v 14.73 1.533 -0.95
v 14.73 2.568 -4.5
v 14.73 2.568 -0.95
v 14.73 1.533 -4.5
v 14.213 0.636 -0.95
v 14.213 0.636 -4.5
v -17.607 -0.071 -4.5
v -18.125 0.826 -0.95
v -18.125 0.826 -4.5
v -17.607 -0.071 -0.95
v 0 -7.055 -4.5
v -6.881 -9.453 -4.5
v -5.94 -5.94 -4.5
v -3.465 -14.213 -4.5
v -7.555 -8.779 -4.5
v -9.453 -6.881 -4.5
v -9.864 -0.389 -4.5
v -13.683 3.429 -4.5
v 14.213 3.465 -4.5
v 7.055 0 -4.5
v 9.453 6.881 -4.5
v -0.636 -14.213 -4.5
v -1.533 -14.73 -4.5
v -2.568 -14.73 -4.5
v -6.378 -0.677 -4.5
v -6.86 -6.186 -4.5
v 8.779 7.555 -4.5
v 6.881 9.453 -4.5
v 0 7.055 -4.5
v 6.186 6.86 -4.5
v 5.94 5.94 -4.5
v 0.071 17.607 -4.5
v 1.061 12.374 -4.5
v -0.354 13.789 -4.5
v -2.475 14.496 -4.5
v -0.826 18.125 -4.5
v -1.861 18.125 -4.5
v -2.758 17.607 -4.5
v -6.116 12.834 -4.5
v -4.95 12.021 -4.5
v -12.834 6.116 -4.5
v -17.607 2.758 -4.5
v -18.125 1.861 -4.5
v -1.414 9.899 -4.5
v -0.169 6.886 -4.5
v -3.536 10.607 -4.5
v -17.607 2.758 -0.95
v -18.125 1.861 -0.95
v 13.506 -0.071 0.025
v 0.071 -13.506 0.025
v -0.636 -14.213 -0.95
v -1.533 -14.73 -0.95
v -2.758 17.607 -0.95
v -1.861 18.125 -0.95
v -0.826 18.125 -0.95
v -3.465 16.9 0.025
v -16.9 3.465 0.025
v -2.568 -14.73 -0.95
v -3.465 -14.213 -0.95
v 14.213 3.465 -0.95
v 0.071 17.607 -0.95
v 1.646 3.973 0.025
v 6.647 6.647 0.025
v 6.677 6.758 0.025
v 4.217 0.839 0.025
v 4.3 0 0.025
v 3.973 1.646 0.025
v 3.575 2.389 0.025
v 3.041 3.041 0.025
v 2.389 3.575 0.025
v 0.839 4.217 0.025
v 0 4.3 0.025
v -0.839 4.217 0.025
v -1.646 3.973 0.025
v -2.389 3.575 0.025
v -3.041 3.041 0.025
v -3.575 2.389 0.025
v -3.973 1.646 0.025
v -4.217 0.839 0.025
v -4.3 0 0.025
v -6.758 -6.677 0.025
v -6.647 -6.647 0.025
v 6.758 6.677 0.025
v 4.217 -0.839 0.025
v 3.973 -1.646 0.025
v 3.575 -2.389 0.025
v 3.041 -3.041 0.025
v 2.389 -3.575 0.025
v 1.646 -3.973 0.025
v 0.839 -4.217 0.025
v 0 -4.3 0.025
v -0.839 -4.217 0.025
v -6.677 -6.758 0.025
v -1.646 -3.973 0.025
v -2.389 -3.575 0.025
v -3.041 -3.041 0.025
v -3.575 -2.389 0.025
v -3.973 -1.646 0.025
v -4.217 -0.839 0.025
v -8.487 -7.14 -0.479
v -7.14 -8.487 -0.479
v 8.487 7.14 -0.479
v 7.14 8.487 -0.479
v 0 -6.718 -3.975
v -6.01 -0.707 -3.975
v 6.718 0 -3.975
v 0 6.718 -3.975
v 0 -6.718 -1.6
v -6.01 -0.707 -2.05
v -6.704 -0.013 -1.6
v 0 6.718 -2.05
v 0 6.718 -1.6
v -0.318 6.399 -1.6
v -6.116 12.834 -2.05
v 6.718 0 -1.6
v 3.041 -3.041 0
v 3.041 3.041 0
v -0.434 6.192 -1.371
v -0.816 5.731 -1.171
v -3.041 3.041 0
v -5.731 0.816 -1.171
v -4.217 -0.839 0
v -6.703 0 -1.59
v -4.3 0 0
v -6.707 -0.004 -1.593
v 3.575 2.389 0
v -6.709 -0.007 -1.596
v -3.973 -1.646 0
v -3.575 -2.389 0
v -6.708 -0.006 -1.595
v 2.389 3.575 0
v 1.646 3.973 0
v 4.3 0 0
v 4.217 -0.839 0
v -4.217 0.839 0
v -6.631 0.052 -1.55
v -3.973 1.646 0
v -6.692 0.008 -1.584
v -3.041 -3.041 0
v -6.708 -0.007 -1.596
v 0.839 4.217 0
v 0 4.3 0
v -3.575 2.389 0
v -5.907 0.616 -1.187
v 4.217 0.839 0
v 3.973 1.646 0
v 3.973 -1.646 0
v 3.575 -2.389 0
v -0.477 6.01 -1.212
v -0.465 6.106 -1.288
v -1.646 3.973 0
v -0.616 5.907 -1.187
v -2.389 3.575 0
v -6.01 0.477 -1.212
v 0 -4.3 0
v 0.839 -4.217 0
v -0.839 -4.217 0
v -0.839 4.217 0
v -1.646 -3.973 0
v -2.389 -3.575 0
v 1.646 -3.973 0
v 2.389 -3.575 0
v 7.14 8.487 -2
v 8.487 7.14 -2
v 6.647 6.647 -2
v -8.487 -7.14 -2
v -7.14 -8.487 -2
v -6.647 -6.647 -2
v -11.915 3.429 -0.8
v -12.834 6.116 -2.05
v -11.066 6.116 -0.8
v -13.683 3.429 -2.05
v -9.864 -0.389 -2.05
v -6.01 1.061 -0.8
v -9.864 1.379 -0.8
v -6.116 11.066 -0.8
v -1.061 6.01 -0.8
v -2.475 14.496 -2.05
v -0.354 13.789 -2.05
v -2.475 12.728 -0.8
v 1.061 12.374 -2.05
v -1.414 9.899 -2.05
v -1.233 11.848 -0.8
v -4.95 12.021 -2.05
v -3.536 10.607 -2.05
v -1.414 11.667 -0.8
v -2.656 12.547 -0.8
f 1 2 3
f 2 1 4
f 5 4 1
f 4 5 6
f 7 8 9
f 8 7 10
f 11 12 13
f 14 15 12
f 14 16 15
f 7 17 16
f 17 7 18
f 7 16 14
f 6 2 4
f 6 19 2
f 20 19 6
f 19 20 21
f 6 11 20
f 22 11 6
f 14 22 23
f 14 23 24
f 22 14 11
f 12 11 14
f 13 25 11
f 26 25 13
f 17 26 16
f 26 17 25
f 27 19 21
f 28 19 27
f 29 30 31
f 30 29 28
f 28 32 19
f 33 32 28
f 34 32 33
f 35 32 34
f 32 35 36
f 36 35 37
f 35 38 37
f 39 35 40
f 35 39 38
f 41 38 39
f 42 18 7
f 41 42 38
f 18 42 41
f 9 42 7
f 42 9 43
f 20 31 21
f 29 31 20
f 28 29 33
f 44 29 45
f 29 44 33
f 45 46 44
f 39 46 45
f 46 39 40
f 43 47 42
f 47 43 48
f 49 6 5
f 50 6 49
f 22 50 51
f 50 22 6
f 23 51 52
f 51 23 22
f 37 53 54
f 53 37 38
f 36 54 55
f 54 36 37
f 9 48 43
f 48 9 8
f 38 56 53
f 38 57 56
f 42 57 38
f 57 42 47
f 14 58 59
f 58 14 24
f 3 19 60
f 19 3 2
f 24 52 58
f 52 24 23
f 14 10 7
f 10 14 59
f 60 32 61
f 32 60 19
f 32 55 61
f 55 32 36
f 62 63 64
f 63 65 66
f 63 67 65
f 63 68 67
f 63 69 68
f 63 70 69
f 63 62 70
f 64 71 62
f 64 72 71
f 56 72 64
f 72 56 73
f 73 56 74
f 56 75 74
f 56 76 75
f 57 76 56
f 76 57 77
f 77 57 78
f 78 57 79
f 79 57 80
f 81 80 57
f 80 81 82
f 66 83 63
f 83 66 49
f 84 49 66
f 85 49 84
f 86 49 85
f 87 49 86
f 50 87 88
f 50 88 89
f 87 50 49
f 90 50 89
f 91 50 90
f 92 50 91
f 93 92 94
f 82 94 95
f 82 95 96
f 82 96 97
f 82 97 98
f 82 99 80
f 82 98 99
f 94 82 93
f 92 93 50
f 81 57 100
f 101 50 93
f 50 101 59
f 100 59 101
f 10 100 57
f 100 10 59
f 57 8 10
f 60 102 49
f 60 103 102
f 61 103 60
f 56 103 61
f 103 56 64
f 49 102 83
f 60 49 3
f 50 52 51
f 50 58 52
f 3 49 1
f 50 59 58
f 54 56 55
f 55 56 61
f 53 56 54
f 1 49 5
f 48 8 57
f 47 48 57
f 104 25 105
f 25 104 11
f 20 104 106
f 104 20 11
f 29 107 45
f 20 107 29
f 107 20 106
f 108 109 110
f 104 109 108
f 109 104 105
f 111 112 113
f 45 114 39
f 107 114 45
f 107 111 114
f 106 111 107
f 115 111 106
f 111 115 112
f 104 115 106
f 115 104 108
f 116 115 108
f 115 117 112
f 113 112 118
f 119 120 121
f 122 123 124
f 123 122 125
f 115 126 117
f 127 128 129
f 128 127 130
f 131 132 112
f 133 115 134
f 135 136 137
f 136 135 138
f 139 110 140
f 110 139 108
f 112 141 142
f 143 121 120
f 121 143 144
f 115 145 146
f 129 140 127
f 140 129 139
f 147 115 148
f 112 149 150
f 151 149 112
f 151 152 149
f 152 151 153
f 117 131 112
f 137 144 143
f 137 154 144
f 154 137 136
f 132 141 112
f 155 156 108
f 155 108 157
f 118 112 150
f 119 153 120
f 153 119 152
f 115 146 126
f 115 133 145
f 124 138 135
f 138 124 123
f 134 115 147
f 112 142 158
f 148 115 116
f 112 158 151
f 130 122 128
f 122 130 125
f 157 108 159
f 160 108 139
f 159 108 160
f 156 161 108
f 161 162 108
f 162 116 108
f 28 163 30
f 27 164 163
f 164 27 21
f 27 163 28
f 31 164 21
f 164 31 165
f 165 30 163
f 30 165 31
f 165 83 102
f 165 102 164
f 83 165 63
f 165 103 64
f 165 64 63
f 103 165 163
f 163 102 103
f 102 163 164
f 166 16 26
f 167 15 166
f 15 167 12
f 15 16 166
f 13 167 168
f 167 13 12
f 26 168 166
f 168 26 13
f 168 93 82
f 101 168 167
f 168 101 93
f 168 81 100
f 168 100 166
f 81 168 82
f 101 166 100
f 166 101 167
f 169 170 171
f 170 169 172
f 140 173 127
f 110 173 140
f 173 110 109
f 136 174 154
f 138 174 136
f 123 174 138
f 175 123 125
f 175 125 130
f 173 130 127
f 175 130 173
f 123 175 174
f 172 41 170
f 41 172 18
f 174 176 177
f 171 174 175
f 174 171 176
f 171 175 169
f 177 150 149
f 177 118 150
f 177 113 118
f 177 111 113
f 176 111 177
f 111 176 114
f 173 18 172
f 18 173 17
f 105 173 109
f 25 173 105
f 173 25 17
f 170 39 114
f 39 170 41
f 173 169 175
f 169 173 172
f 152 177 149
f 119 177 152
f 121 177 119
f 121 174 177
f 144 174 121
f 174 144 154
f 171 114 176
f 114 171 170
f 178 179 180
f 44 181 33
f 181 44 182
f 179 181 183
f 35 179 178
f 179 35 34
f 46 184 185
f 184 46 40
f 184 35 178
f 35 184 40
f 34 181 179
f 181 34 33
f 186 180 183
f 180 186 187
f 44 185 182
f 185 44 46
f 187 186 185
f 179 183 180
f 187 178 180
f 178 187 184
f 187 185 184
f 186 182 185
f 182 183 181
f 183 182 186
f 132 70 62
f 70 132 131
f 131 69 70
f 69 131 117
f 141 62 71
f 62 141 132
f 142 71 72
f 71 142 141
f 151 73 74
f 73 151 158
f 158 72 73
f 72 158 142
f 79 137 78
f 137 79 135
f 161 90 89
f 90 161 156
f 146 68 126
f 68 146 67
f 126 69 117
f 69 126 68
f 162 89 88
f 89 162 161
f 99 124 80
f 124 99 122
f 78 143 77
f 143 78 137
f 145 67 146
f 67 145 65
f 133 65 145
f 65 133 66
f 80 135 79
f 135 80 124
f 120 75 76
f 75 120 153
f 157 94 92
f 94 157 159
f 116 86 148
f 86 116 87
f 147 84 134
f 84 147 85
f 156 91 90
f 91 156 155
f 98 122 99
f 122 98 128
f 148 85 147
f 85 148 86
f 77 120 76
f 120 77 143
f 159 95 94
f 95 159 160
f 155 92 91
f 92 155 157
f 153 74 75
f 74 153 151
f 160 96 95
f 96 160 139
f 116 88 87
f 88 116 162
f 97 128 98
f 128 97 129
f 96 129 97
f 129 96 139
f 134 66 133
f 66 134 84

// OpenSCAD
// file: range_tour_dashcam.scad
/******************************************************************
*                                                                 *
* OpenFlexure Microscope: USB camera push-fit mount               *
*                                                                 *
* This is part of the OpenFlexure microscope, an open-source      *
* microscope and 3-axis translation stage.  It gets really good   *
* precision over a ~10mm range, by using plastic flexure          *
* mechanisms.                                                     *
*                                                                 *
* This file defines one useful function, usbcam_push_fit().  It's *
* designed to be subtracted from a solid block, with the bottom   *
* of the block at z=0.  It grips the plastic camera housing with  *
* a "trylinder" gripper, holding it in securely.  It might be     *
* that you need a cover or something to secure the camera fully.  *
*                                                                 *
* (c) Richard Bowman, January 2016                                *
* Released under the CERN Open Hardware License                   *
*                                                                 *
******************************************************************/


use <../utilities.scad>;

// Camera geometry (mostly of the bottom of the lens mount)
lens_holder_tube_r = 13.5/2; // the tube into which the lens screws
lens_holder_tube_h = 12.6; // the height of the tube above the PCB
lens_holder_clearance = 0.35; // extra space around the camera to make sure it fits
lens_holder_box_h = 3.6;
lens_holder_box = [2,2,0] * lens_holder_tube_r + [0,0,1] * lens_holder_box_h; // box at the bottom of the tube
lens_holder_mounting_screw_y = 9; // position of the lugs for mounting screws
lens_holder_mounting_screw_lug_r = 2.2; // size of above.
camera_component_clearance = 1; // it's easiest to have the PCB slightly below the mount

d=0.05; //small distance!
$fn=32;

function range_tour_camera_sensor_height() = 0.5; //Height of the sensor above the PCB

function range_tour_camera_mount_height()=4;

module range_tour_camera_mount(){
    h = range_tour_camera_mount_height();
    sy = lens_holder_mounting_screw_y;
    sr = lens_holder_mounting_screw_lug_r+0.5;
    box_w = 13.2 + 1; //make it slightly fatter so it grips the bed more
    sensor_w = 10 + 0.8; //reasonably tight fit around sensor
    solder_w = (box_w-1.2*2); //the solder terminals need some give
    translate([0,0,-h]) difference(){
        linear_extrude(h+d) difference(){
            union(){
                square(box_w, center=true);
                hull() reflect([0,1]) translate([0,sy]) circle(r=sr, $fn=16);
            }
            //screws
            reflect([0,1]) translate([0,sy]) circle(d=1.5, $fn=16);
            //sensor
            //square(sensor_w, center=true);
        }
        //chamfer the screw holes
        reflect([0,1,0]) translate([0,sy,0]){
            cylinder(r1=3, r2=0,h=4, center=true);
            deformable_hole_trylinder(1.5/2,2.1/2,h=12, center=true);
        }
        // enlarge the cut out for the sensor
        // NB the solder terminals will distort the thin bottom, this
        // is intentional, to help with bed adhesion
        cube([sensor_w, sensor_w, 2],center=true);
        sequential_hull(){
            translate([0,0,0.7]) cube([solder_w,solder_w,d],center=true);
            translate([0,0,0.7+(solder_w-sensor_w)/2]) cube([sensor_w, sensor_w, d],center=true);
            translate([0,0,2]) cube([sensor_w, sensor_w, d],center=true);
            translate([0,0,h+d]) cylinder(r=5,h=d);
        }
    }
}
range_tour_camera_mount();
module range_tour_bottom_mounting_posts(height=-1, radius=-1, outers=true, cutouts=true){
    // posts to mount to pi camera from below
    r = radius > 0 ? radius : 2;
    h = height > 0 ? height : 4;
    rotate(45)
    for(pos=[[19/2, 10/2, 0], [-19/2, -10/2, 0]]) translate(pos) difference(){
        if(outers) cylinder(r=r, h=h, $fn=12);
        if(cutouts) intersection(){
            cylinder(h=13, d=2*1.7, center=true, $fn=3);
            rotate(60) cylinder(h=999, d=2*1.7*1.4, center=true, $fn=3);
        }
    }
}

//range_tour_bottom_mounting_posts();
// file: 6led.scad
/******************************************************************
*                                                                 *
* OpenFlexure Microscope: USB camera push-fit mount               *
*                                                                 *
* This is part of the OpenFlexure microscope, an open-source      *
* microscope and 3-axis translation stage.  It gets really good   *
* precision over a ~10mm range, by using plastic flexure          *
* mechanisms.                                                     *
*                                                                 *
* This file defines one useful function, usbcam_push_fit().  It's *
* designed to be subtracted from a solid block, with the bottom   *
* of the block at z=0.  It grips the plastic camera housing with  *
* a "trylinder" gripper, holding it in securely.  It might be     *
* that you need a cover or something to secure the camera fully.  *
*                                                                 *
* (c) Richard Bowman, January 2016                                *
* Released under the CERN Open Hardware License                   *
*                                                                 *
******************************************************************/


use <../utilities.scad>
use <./m12.scad>

// Camera geometry (mostly of the bottom of the lens mount)
lens_holder_tube_r = 13.5/2; // the tube into which the lens screws
lens_holder_tube_h = 12.6; // the height of the tube above the PCB
lens_holder_clearance = 0.35; // extra space around the camera to make sure it fits
lens_holder_box_h = 3.6;
lens_holder_box = [2,2,0] * lens_holder_tube_r + [0,0,1] * lens_holder_box_h; // box at the bottom of the tube
lens_holder_mounting_screw_y = 9; // position of the lugs for mounting screws
lens_holder_mounting_screw_lug_r = 2.2; // size of above.
camera_component_clearance = 1; // it's easiest to have the PCB slightly below the mount

d=0.05; //small distance!
$fn=32;

function 6led_camera_sensor_height() = m12_camera_sensor_height(); //Height of the sensor above the PCB


module 6led_lens_mount(){
    m12_lens_mount();
}


function 6led_camera_mount_height()=m12_camera_mount_height();

module 6led_camera_mount(){ //this is the same as the M12 mount
    m12_camera_mount();
}


module 6led_bottom_mounting_posts(height=-1, radius=-1, outers=true, cutouts=true){
    //holes are (28-2.25*2)=23.5mm apart in Y and (33-4.45*2)=24.1mm apart in X
    r = radius > 0 ? radius : 2;
    h = height > 0 ? height : 4;
    rotate(45)
    reflect([1,0,0]) reflect([0,1,0]) translate([24.1/2, 23.5/2, 0]) difference(){
        if(outers) cylinder(r=r, h=h, $fn=12);
        if(cutouts) intersection(){
            translate([0,0,-2]) rotate(75) trylinder_selftap(2, h=h+3);
        }
    }
}

//translate([0,0,-1]) picam_pcb_bottom();
// file: m12.scad
/******************************************************************
*                                                                 *
* OpenFlexure Microscope: USB camera push-fit mount               *
*                                                                 *
* This is part of the OpenFlexure microscope, an open-source      *
* microscope and 3-axis translation stage.  It gets really good   *
* precision over a ~10mm range, by using plastic flexure          *
* mechanisms.                                                     *
*                                                                 *
* This file defines one useful function, usbcam_push_fit().  It's *
* designed to be subtracted from a solid block, with the bottom   *
* of the block at z=0.  It grips the plastic camera housing with  *
* a "trylinder" gripper, holding it in securely.  It might be     *
* that you need a cover or something to secure the camera fully.  *
*                                                                 *
* (c) Richard Bowman, January 2016                                *
* Released under the CERN Open Hardware License                   *
*                                                                 *
******************************************************************/


use <../utilities.scad>

// Camera geometry (mostly of the bottom of the lens mount)
lens_holder_tube_r = 13.5/2; // the tube into which the lens screws
lens_holder_tube_h = 12.6; // the height of the tube above the PCB
lens_holder_clearance = 0.35; // extra space around the camera to make sure it fits
lens_holder_box_h = 3.6;
lens_holder_box = [2,2,0] * lens_holder_tube_r + [0,0,1] * lens_holder_box_h; // box at the bottom of the tube
lens_holder_mounting_screw_y = 9; // position of the lugs for mounting screws
lens_holder_mounting_screw_lug_r = 2.2; // size of above.
camera_component_clearance = 1; // it's easiest to have the PCB slightly below the mount

$fn=32;

function m12_camera_sensor_height() = 0.5; //Height of the sensor above the PCB


module usbcam_lens_mount(){
    union(){
        cylinder(r=lens_holder_tube_r, h=lens_holder_tube_h, $fn=16);
        translate([0,0,lens_holder_box_h/2]) cube(lens_holder_box, center=true);
        hull() reflect([0,1,0]) translate([0,lens_holder_mounting_screw_y,0])
            cylinder(r=lens_holder_mounting_screw_lug_r, h=lens_holder_box_h, $fn=12);
    }
}


function m12_camera_mount_height()=4;

module m12_camera_mount(){
    h = m12_camera_mount_height();
    sy = lens_holder_mounting_screw_y;
    sr = lens_holder_mounting_screw_lug_r+0.5;
    box_w = 13.2 + 1; //make it slightly fatter so it grips the bed more
    sensor_w = 10 + 0.8; //reasonably tight fit around sensor
    solder_w = (box_w-1.2*2); //the solder terminals need some give
    translate([0,0,-h]) difference(){
        linear_extrude(h+tiny()) difference(){
            union(){
                square(box_w, center=true);
                hull() reflect([0,1]) translate([0,sy]) circle(r=sr, $fn=16);
            }
            //screws
            reflect([0,1]) translate([0,sy]) circle(d=1.5, $fn=16);
            //sensor
            //square(sensor_w, center=true);
        }
        //chamfer the screw holes
        reflect([0,1,0]) translate([0,sy,0]){
            cylinder(r1=3, r2=0,h=4, center=true);
            deformable_hole_trylinder(1.5/2,2.1/2,h=12, center=true);
        }
        // enlarge the cut out for the sensor
        // NB the solder terminals will distort the thin bottom, this
        // is intentional, to help with bed adhesion
        cube([sensor_w, sensor_w, 2],center=true);
        sequential_hull(){
            translate([0,0,0.7]) cube([solder_w,solder_w,tiny()],center=true);
            translate([0,0,0.7+(solder_w-sensor_w)/2]) cube([sensor_w, sensor_w, tiny()],center=true);
            translate([0,0,2]) cube([sensor_w, sensor_w, tiny()],center=true);
            translate([0,0,h+tiny()]) cylinder(r=5,h=tiny());
        }
    }
}
camera_mount();

//translate([0,0,-1]) picam_pcb_bottom();
// file: logitech_c270.scad
/******************************************************************
*                                                                 *
* OpenFlexure Microscope: Logitech C270 screw-on-from-bottm mount *
*                                                                 *
* This is part of the OpenFlexure microscope, an open-source      *
* microscope and 3-axis translation stage.  It gets really good   *
* precision over a ~10mm range, by using plastic flexure          *
* mechanisms.                                                     *
*                                                                 *
* This file defines a camera mount (together with functions that  *
* return the mount height and sensor position) for the Logitech   *
* C270 webcam.                                                    *
*                                                                 *
*                                                                 *
* (c) Richard Bowman, January 2016                                *
* Released under the CERN Open Hardware License                   *
*                                                                 *
******************************************************************/


use <../utilities.scad>



$fn=48;
d=0.05;


function c270_camera_mount_height() = 4.5;
bottom = c270_camera_mount_height() * -1;
function c270_camera_sensor_height() = 0.2; //Height of the sensor above the PCB

module mounting_hole(){
    translate([0,0,-5]) cylinder(r=0.8*1.2,h=999,$fn=12);
    translate([0,0,-0.5]) cylinder(r1=0.8*1.2,h=1,r2=0.8*1.2+1,$fn=12);
}

module C270(beam_r=5, beam_h=6){
    //cut-out to fit logitech C270 webcam
    //optical axis at (0,0)
    //top of PCB at (0,0,0)
    mounting_hole_x = 8.25;
    mirror([0,0,1]){ //parts cut out of the mount are z<0
        //beam clearance
        hull(){
            cube([8,8,6],center=true);
            translate([0,0,-beam_h]) cylinder(r=beam_r,h=2*d,center=true);
        }

        //mounting holes
        reflect([1,0,0]) translate([mounting_hole_x,0,0]) mounting_hole();

        //clearance for PCB
        translate([0,0,0]){
            hull(){
                translate([-10/2,-13.5,0]) cube([10,d,8]);
                translate([-21.5/2,-4,0]) cube([21.5,41,8]);
                translate([-10/2,45,0]) cube([10,d,8]);
            }
            reflect([0,1,0]) hull(){
                translate([-4.5,6,-1.5]) cube([9,7.5,8]);
                translate([-5.5,6,-1.5]) cube([11,6.5,8]);
            }
            difference(){
                hull(){
                    translate([0,22.5,0+4]) cube([20.5,28,15],center=true);
                    translate([0,34,0+4]) cube([10,9.5*2,15],center=true);
                }
                translate([-5,39.5,-999]) mirror([1,0,0]) cube([999,999,999]);
            }
            translate([-6,42.3,0]) mounting_hole();
        }

        //exit for cable
        translate([4,20,0]) rotate([-90,0,0]) cylinder(r=3,h=99);
    }
}

module c270_camera_mount(){
    // A mount for the pi camera v2
    // This should finish at z=0+d, with a surface that can be
    // hull-ed onto the lens assembly.
    h = 58;
    w = 25;
    rotate(-45) difference(){
        translate([-w/2, -13, bottom]) cube([w, h, c270_camera_mount_height()]);
        translate([0,0,bottom]) C270();
    }
}
c270_camera_mount();
// file: ../microscope_parameters.scad
/******************************************************************
*                                                                 *
* OpenFlexure Microscope: Microscope Parameters                   *
*                                                                 *
* This is the top-level configuration file for the OpenFlexure    *
* microscope, an open microscope and 3-axis translation stage.    *
* It gets really good precision over a ~10mm range, by using      *
* plastic flexure mechanisms.                                     *
*                                                                 *
* Generally I've tried to put parts (or collections of closely    *
* related parts) in their own files.  However, all the parts      *
* depend on the geometry of the microscope - so these parameters  *
* are gathered together here.  In general, the ones you might     *
* to change are towards the top!  Lower-down ones are defined in  *
* terms of higher-up ones - confusion might arise if you redefine *
* these later...                                                  *
*                                                                 *
* (c) Richard Bowman, January 2016                                *
* Released under the CERN Open Hardware License                   *
*                                                                 *
* http://www.github.com/rwb27/openflexure_microscope              *
* http://www.docubricks.com/projects/openflexure-microscope       *
* http://www.waterscope.org                                       *
*                                                                 *
******************************************************************/

d = 0.05;
$fn=32;

// These are the most useful parameters to change!
motor_lugs = true;
version_numstring = "6.1.3";
camera = "picamera_2"; //see cameras/camera.scad for valid values
optics = "rms_f50d13"; //see optics.scad for valid values
led_r = 4.5/2; //size of the LED used for illumination
endstops = false; //whether to build mounts for optical endstops inside the microscope.
feet_endstops = false; //whether to include cut-outs for endstop switches in the feet. 
beamsplitter = true; //enables a cut-out in some optics modules for a beamsplitter
smart_brim_r = 5;
enable_smart_brim = true;

// This sets the basic geometry of the microscope
sample_z = 75; // z position of sample
leg_height = sample_z-10; // height of the top of the leg. Shorter by 10 to give space to insert nuts.

leg_r = 30; // radius on which the innermost part of legs sit. (This sets the stage size)
hole_r = 20; // size of hole in the stage
xy_lever_ratio = 4.0/7.0; // mechanical advantage of actuator over stage - can be used to trade speed and precision
z_lever_ratio = 1.0; // as above, for Z axis (must be >1)

// The variables below affect the position of the objective mount
z_strut_l = 18; //length of struts supporting Z carriage
objective_mount_y = 18; // y position of clip for optics
objective_mount_nose_w = 6; // width of the pointy end of the mount
condenser_clip_w = 14; // width of the dovetail clip for the condenser
foot_height=feet_endstops?15:15; //the endstops need a bit of extra height (or not)

// These variables set the dimensions of flexures
// You might want to tweak them if your material (or printer)
// is different from the ones I've tested, though ABS/PLA extrusion
// is generally fine with my parameters
stage_flex_w = 4; // width of XY axis flexures
zflex_l = 1.5;    // length of (all) flexible bits
zflex_t = 0.75;   // thickness of (all) flexible bits
zflex = [stage_flex_w, zflex_l, zflex_t]; // the above in new-style format
flex_a = 0.15;    // sine of the angle through which flexures can be bent

// Compile a sensible version string
version_string = str("v",version_numstring, sample_z, motor_lugs?"-M":"");
echo(str("Compiling OpenFlexure Microscope ",version_string));


leg_block_t = 5; // Thickness of the block at the top and bottom of the leg
stage_t = sample_z-leg_height + leg_block_t; //thickness of the XY stage (at thickest point, most is 1mm less)
stage_hole_inset = zflex_l+4; // how far the holes on the XY stage are inset from leg_r
flex_z1 = 0;      // z position of lower flexures for XY axis
flex_z2 = leg_height-leg_block_t; //height of upper XY flexures
z_strut_t = 6;  // (z) thickness of struts for Z axis
z_flex_w = 4;   // width of struts for Z axis
leg = [4,stage_flex_w,flex_z2+zflex_t]; // size of vertical legs
leg_middle_w = 12; // width of the middle part of each leg
actuator_h = 25; //height of the actuator columns
dz = 0.5; //small increment in Z (~ 2 layers)

leg_outer_w = leg_middle_w + 2*zflex_l + 2*leg[0]; // overall width of parallelogram legs that support the stagef
actuator = [3*1.2+2*2,(flex_z2 - flex_z1)*xy_lever_ratio,6]; // dimensions of the core part of the actuating levers for X and Y - NB should match the column_base_r in compact_nut_seat.scad
actuating_nut_r = (flex_z2 - flex_z1)*xy_lever_ratio; // distance from leg_r to the actuating nut/screw for the XY axes
xy_actuator_travel = actuating_nut_r*0.15; // distance moved by XY axis actuators

// Z axis
z_flexures_z1 = 8; // height of the lower flexure on z actuator
z_flexures_z2 = min(leg_height - 12, 35); // height of the upper flexure on z actuator
objective_mount_back_y = objective_mount_y + 2; //back of objective mount
z_anchor_y = objective_mount_back_y + z_strut_l + 2*zflex[1]; // fixed end of the flexure-hinged lever that actuates the Z axis
z_anchor_w = 20; //width of the Z anchor
zll = (z_strut_l + zflex[1])*z_lever_ratio; //required actuator lever length
zfz = z_flexures_z1; // shorthand for the next line only!
z_nut_y = z_anchor_y - zflex[1]/2 + sqrt(zll*zll - zfz*zfz);
z_actuator_travel = zll*0.15; // distance moved by the Z actuator
z_actuator_tilt = -asin(z_flexures_z1/zll); //angle of the Z actuator

z_flexure_x = (leg_r-zflex_l-max(5,leg[2]*0.1))*sqrt(2); // x position of the outside of the Z-axis static anchors (either side of the XY stage, on the X axis) (no longer used by Z axis but still in use elsewhere.)

bridge_dz = 10; // spacing between thin links on legs
base_t=1; // thickness of the flat base of the structure
wall_h=15; // height of the stiffening vertical(ish) walls
wall_t=2; //thickness of the stiffening walls
zawall_h = z_flexures_z2 - 10; //height of wall near Z anchor
zbwall_h = z_flexures_z2 - 10; //height of bridge over Z lever
illumination_clip_y = (-(leg_r-zflex_l-wall_t/2+leg_outer_w/2)/sqrt(2)
                       -wall_t/2-1); //position of clip for
                      // illumination/back foot.  This is set to
                      // coincide with the wall between the back
                      // two legs. TODO: remove this
illumination_arm_screws = [[20,z_nut_y,leg_height-2],[-20,z_nut_y,leg_height-2], 
                           [0,(leg_r + leg_outer_w)/sqrt(2) + 4,leg_height-2]];
                      // positions of screws that mount the adjustable version of the 
                      // illumination arm
condenser_clip_y = -8; //position of dovetail for old condenser assembly TODO: rename this
base_mounting_holes = [[-20,z_nut_y-4,0],
                       [20,z_nut_y-4,0],
                       [-z_flexure_x-4,-8,0],
                       [z_flexure_x+4,-8,0]]; 
                       // holes to screw the microscope to a baseplate

endstop_extra_ringheight=feet_endstops?1:0;
endstop_hole_offset=0;
//this is a temporary option to printfeet with smaller travel
//without this with 15mm hole the stage hits the objective
//the stage can move ~3mm in each direction, so the actuator only moves
//~1.7 mm
avoid_objective_xyfoot_offset=xy_actuator_travel-1.8;

fl_cube_w = 16; //width of the fluorescence filter cube
// main file
/******************************************************************
*                                                                 *
* OpenFlexure Microscope: Camera mount                            *
*                                                                 *
* This is part of the OpenFlexure microscope, an open-source      *
* microscope and 3-axis translation stage.  It gets really good   *
* precision over a ~10mm range, by using plastic flexure          *
* mechanisms.                                                     *
*                                                                 *
* This file defines the camera mount module, as well as two       *
* functions that return the height of the module and the position *
* of the sensor within that module.  It picks between the various *
* supported cameras using the "camera" variable.                  *
*                                                                 *
*                                                                 *
* (c) Richard Bowman, January 2016                                *
* Released under the CERN Open Hardware License                   *
*                                                                 *
******************************************************************/

include <../microscope_parameters.scad>;
use <./logitech_c270.scad>;
use <./picamera_2.scad>;
use <./m12.scad>;
use <./6led.scad>;
use <./range_tour_dashcam.scad>;

// If I was able to selectively include different files, this wouldn't be needed.
// However, doing this saves the faff of precompiling the SCAD source with some
// dodgy ad-hoc script, and is probably the best compromise.  The ternary operator
// is necessary as proper if statements aren't currently allowed in OpenSCAD functions.

// See the functions below for valid values of "camera".
// Each of the included files above defines the functions for one camera.

function camera_mount_height() =
    // the height of the camera mount - above this comes the optics module.
    camera=="logitech_c270"?c270_camera_mount_height()
    :(camera=="m12"?m12_camera_mount_height()
    :(camera=="6led"?6led_camera_mount_height()
    :(camera=="range_tour"?range_tour_camera_mount_height()
    :picamera_2_camera_mount_height()
    )));
function camera_sensor_height() =
    // the height of the camera mount - above this comes the optics module.
    camera=="logitech_c270"?c270_camera_sensor_height()
    :(camera=="m12"?m12_camera_sensor_height()
    :(camera=="6led"?6led_camera_sensor_height()
    :(camera=="range_tour"?range_tour_camera_sensor_height()
    :picamera_2_camera_sensor_height()
    )));
module camera_mount(counterbore=false){
    if(camera=="logitech_c270") c270_camera_mount();
    else if(camera=="m12") m12_camera_mount();
    else if(camera=="6led") 6led_camera_mount();
    else if(camera=="range_tour") range_tour_camera_mount();
    else picamera_2_camera_mount(counterbore=counterbore);
}
module camera_bottom_mounting_posts(h=-1, r=-1, outers=true, cutouts=true){
    if(camera=="logitech_c270") c270_bottom_mounting_posts();
    else if(camera=="m12") m12_bottom_mounting_posts();
    else if(camera=="6led") 6led_bottom_mounting_posts(height=h, radius=r, outers=outers, cutouts=cutouts);
    else if(camera=="range_tour") range_tour_bottom_mounting_posts(height=h, radius=r, outers=outers, cutouts=cutouts);
    else picamera_2_bottom_mounting_posts(height=h, radius=r, outers=outers, cutouts=cutouts);
}

echo(str("Camera mount height: ",camera_mount_height()));
echo(str("Camera sensor height: ",camera_mount_height()));
camera_mount();
